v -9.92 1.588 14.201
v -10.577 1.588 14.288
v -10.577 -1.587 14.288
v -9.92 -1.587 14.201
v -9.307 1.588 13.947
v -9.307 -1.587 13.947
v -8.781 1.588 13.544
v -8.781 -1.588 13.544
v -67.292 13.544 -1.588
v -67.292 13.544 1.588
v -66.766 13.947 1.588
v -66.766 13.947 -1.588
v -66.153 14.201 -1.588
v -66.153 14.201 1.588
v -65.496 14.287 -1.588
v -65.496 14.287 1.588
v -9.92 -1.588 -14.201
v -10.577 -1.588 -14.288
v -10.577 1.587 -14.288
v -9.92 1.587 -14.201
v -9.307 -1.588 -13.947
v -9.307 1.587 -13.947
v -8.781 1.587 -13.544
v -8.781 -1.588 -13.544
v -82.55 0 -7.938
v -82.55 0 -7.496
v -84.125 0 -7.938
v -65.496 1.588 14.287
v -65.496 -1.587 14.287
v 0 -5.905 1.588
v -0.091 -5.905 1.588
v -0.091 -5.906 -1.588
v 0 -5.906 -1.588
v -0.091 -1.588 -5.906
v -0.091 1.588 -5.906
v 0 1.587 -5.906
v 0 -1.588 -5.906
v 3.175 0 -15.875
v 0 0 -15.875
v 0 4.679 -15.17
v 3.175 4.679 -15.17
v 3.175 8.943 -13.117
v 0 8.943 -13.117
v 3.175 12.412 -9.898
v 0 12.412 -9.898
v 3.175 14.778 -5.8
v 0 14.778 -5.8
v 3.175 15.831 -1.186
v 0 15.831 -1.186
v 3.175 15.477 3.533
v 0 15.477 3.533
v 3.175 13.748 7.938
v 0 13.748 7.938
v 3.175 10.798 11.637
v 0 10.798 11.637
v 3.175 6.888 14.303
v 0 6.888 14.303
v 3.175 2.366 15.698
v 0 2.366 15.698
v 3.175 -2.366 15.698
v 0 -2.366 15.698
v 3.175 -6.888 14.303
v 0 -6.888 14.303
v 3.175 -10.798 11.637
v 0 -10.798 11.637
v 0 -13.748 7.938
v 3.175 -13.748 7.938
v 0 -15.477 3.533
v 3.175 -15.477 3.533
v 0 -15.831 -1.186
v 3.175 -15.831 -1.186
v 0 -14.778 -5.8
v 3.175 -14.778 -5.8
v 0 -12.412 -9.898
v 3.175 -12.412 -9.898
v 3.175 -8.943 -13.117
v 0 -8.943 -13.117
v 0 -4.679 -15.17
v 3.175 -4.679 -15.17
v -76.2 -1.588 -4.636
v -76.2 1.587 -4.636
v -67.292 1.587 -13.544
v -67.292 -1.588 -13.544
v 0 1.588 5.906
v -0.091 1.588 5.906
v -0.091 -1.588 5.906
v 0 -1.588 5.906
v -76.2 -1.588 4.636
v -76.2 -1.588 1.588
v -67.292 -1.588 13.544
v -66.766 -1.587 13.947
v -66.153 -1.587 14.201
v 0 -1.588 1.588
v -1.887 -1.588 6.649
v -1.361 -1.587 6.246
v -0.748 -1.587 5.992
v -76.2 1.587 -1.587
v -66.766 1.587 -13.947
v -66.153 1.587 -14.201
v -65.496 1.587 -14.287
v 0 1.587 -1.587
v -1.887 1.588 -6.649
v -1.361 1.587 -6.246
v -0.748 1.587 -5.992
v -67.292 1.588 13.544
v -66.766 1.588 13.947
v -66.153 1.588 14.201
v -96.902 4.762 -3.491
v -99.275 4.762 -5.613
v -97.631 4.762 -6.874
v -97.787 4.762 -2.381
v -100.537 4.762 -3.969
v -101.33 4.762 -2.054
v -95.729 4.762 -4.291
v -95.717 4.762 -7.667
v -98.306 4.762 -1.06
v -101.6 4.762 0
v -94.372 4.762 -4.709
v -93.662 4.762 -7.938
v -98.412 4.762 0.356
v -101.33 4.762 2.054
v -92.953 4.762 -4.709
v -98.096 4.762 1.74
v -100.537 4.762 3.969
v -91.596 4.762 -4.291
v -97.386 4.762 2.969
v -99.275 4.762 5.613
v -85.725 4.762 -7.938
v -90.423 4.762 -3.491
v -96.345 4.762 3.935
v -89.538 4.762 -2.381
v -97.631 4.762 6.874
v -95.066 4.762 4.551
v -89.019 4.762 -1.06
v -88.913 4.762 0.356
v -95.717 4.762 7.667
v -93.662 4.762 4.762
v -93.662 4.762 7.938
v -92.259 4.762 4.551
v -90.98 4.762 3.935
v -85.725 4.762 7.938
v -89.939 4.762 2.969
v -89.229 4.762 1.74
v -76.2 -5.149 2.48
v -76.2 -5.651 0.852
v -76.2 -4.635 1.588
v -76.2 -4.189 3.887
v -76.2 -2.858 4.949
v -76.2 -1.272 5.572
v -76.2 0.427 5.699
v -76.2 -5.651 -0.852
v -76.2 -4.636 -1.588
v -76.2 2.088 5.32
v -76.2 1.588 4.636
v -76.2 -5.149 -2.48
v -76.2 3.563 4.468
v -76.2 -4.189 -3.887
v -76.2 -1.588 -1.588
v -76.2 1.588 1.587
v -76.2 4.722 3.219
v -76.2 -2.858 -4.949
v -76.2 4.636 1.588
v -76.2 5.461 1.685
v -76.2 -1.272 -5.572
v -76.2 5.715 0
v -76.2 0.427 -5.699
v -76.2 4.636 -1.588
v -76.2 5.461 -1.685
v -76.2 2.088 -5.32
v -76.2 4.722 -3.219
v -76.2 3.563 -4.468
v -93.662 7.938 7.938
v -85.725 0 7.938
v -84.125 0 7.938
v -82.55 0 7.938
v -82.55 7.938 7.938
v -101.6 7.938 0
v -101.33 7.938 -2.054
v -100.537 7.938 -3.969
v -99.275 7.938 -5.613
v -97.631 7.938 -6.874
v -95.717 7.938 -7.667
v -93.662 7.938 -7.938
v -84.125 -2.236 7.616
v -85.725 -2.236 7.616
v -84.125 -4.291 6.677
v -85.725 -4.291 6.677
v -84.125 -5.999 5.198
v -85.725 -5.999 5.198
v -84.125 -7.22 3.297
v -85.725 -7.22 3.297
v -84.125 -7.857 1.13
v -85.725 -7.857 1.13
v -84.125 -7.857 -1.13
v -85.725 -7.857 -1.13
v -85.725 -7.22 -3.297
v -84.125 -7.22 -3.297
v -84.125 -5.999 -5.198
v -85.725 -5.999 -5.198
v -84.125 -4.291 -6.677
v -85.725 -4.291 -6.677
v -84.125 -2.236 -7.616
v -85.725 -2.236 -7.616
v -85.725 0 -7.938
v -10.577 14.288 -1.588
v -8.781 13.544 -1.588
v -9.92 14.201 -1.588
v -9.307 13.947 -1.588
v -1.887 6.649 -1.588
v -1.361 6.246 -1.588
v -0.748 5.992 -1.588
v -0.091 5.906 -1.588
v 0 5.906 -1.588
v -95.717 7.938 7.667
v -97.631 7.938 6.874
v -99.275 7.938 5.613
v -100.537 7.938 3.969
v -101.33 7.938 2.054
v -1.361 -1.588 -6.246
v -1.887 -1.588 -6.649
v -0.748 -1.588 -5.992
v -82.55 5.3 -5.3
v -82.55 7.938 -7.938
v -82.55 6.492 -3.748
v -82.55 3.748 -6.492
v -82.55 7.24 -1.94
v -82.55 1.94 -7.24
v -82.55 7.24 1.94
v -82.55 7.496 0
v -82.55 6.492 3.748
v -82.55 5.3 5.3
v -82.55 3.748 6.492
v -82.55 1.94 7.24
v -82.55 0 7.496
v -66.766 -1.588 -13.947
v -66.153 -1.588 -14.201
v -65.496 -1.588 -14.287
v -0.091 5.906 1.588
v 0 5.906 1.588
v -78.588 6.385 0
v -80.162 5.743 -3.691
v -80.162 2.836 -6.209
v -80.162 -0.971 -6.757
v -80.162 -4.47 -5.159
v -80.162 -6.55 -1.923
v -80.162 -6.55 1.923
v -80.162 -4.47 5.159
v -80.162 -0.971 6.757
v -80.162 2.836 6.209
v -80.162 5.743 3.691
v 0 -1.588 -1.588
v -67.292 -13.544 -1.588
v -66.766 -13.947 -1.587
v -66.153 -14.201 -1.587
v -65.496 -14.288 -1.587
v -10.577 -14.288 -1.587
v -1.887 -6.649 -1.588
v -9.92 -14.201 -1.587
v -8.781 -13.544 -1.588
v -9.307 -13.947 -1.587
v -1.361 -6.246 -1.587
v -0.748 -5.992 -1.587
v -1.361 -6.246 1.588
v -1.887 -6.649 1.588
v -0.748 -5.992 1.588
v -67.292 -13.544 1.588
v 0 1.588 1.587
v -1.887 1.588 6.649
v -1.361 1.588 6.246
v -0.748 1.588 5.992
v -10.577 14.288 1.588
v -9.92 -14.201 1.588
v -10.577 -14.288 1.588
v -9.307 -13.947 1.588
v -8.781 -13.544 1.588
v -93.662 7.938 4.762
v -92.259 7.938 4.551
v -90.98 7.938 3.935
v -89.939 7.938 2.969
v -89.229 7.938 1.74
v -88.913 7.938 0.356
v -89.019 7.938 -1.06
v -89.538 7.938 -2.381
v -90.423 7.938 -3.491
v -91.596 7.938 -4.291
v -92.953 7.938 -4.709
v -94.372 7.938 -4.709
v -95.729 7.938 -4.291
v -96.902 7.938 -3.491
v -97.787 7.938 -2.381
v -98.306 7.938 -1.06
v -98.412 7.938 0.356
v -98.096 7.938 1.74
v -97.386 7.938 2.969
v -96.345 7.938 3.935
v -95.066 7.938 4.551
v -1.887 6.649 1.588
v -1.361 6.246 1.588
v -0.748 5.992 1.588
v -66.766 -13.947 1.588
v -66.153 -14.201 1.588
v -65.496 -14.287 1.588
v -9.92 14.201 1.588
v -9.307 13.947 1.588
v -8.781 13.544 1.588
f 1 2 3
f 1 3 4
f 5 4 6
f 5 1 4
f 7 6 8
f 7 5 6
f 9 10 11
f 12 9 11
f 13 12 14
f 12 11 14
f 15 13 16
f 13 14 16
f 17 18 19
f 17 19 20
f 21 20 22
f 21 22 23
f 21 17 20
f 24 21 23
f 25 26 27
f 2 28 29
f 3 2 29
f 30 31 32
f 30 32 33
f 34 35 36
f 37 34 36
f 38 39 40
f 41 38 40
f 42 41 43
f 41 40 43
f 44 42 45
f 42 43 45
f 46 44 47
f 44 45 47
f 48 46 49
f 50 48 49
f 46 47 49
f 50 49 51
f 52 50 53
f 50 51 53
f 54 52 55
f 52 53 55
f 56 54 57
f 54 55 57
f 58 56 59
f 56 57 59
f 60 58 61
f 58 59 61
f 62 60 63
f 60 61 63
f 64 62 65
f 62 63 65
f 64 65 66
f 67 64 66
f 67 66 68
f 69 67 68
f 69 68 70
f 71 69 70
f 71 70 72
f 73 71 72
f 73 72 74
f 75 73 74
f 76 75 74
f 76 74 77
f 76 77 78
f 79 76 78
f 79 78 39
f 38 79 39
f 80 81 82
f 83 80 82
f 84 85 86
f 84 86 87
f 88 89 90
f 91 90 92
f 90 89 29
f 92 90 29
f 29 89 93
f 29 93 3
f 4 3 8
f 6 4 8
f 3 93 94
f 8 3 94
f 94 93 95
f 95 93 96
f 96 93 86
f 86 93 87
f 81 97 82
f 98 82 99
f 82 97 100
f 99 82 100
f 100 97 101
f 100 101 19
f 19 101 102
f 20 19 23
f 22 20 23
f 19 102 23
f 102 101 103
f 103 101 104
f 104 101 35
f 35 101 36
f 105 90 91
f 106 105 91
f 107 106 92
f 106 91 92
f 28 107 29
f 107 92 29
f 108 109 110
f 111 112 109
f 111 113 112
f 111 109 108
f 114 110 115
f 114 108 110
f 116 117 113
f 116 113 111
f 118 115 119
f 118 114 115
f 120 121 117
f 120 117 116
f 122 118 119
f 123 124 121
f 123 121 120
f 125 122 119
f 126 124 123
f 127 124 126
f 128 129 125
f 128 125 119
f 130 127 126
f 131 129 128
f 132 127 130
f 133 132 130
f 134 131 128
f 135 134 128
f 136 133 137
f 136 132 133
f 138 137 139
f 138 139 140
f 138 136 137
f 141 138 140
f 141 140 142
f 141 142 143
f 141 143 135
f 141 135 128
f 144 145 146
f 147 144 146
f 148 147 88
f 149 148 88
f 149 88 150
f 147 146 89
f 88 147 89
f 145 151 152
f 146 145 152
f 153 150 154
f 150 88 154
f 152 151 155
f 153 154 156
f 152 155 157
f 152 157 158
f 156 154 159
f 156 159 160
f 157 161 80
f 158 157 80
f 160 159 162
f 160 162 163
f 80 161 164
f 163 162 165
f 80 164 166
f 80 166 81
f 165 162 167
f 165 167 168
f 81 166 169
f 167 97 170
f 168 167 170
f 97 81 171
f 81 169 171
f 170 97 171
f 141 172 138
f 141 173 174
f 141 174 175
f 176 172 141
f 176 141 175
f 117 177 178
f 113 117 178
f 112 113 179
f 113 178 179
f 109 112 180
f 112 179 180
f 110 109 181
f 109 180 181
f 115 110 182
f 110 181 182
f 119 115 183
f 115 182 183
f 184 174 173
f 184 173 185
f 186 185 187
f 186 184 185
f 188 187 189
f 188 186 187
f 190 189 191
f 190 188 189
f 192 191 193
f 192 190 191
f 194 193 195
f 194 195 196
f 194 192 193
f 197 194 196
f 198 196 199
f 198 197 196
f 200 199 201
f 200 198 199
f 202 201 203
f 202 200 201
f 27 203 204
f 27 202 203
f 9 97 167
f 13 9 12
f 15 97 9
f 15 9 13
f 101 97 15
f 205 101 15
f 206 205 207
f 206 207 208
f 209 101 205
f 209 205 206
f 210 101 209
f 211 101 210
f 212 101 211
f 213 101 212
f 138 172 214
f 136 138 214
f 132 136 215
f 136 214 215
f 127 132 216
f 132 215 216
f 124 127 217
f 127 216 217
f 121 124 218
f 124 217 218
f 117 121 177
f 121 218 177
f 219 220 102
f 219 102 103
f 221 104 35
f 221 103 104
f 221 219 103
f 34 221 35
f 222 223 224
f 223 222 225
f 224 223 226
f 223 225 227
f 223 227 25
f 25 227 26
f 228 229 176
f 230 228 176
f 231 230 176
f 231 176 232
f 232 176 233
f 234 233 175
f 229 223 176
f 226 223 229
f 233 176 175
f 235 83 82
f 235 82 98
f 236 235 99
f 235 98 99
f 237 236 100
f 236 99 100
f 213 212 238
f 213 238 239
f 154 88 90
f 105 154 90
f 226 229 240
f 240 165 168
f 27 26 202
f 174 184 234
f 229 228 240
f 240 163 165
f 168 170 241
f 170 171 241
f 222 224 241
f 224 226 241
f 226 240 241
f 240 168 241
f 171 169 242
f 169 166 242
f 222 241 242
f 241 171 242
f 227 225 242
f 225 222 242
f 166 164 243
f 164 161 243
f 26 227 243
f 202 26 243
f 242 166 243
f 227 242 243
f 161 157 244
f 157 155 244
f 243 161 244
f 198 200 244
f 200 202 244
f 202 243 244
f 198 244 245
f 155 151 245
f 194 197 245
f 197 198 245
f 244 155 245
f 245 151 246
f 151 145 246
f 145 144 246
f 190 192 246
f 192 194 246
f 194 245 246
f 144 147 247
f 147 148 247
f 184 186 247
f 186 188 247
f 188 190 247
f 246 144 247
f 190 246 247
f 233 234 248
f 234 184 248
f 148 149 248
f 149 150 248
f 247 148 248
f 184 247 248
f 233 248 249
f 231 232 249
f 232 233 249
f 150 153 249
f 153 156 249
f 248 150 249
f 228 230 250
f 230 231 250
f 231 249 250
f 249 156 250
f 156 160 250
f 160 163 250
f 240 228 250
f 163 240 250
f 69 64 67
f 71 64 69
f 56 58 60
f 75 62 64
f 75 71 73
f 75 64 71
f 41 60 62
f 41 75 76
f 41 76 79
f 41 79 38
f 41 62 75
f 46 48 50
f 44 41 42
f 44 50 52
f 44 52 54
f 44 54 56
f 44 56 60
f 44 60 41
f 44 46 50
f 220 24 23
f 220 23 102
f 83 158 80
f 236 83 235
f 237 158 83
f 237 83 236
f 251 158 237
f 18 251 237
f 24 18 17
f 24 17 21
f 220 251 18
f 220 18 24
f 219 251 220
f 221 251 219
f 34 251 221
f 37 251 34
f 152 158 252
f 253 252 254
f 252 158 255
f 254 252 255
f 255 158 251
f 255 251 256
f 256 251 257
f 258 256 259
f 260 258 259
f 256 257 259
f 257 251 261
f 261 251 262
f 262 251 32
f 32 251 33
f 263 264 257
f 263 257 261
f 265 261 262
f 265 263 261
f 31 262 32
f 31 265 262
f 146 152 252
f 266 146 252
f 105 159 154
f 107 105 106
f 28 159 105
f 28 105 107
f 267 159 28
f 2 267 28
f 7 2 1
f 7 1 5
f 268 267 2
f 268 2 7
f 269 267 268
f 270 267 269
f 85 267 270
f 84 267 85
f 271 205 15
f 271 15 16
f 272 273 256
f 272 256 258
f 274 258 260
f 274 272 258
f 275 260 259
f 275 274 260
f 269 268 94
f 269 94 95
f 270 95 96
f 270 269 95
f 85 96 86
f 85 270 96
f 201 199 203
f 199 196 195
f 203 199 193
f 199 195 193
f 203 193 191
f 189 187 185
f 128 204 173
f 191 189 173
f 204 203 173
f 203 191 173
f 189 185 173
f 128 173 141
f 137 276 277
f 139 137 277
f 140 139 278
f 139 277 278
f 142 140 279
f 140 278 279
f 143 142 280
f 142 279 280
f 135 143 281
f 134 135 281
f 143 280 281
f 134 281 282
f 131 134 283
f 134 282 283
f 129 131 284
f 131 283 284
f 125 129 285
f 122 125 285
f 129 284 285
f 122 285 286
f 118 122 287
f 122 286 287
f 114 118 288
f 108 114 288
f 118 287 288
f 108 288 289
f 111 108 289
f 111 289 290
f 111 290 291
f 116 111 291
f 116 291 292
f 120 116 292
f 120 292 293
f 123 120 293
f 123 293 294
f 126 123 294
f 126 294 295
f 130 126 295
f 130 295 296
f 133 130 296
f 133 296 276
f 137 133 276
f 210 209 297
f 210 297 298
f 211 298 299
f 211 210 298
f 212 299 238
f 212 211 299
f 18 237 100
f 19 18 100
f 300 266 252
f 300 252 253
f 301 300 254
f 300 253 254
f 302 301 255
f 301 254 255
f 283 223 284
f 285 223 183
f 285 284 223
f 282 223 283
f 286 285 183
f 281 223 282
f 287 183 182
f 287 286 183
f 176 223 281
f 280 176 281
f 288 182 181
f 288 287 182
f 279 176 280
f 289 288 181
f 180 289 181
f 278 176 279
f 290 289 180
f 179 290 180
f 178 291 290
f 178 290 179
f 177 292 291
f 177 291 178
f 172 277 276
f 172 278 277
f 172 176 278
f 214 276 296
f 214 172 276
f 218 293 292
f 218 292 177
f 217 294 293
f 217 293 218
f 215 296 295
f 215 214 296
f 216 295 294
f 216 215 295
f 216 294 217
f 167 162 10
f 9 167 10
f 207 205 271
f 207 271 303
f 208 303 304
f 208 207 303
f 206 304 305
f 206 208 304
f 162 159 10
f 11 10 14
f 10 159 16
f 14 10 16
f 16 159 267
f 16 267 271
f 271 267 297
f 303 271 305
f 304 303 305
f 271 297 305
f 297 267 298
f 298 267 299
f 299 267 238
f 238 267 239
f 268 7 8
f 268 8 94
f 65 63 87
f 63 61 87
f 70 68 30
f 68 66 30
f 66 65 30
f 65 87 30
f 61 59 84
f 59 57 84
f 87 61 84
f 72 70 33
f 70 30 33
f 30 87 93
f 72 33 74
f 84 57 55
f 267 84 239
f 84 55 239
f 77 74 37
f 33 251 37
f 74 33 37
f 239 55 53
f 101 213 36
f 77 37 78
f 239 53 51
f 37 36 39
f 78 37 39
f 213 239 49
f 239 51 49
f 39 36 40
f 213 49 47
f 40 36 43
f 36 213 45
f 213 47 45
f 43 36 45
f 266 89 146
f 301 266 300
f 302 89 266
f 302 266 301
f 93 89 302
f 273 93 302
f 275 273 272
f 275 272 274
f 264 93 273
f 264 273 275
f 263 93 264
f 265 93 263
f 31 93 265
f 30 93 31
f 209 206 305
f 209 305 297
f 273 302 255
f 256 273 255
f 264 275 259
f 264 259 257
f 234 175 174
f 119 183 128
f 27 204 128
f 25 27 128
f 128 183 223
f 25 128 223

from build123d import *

# Parameters (mm, degrees)
SKETCH1_R            = 15.875
BOSS_EXTRUDE1_DEPTH  = 3.175
SKETCH5_W            = 3.175
SKETCH5_H            = 14.2875
BOSS_EXTRUDE3_DEPTH  = 76.2
CUT_EXTRUDE1_DEPTH   = 80.770887743
CIRPATTERN2_COUNT    = 4
BOSS_EXTRUDE21_DEPTH = 1.6002
SKETCH18_W           = 3.175
SKETCH18_H           = 7.9375
CUT_EXTRUDE7_DEPTH   = 7.9375
SKETCH19_W           = 15.875
SKETCH19_H           = 3.175
BOSS_EXTRUDE22_DEPTH = 7.9375
SKETCH20_R           = 4.7625
CUT_EXTRUDE8_DEPTH   = 106.553828833


with BuildPart() as part:
    # Sketch1 → Boss-Extrude1 (new body)
    with BuildSketch(Plane(origin=(0, 0, 0), x_dir=(0, 0, -1), z_dir=(1, 0, 0))):
        Circle(SKETCH1_R)
    extrude(amount=BOSS_EXTRUDE1_DEPTH)

    # Sketch5 → Boss-Extrude3 (add)
    with BuildSketch(Plane.ZY):
        with Locations((0, 7.14375)):
            Rectangle(SKETCH5_W, SKETCH5_H)
    boss_extrude3 = extrude(amount=BOSS_EXTRUDE3_DEPTH)

    # Sketch6 → Cut-Extrude1 (cut, symmetric)
    with BuildSketch(Plane.XY.offset(1.5875)):
        with BuildLine():
            Line((0, 14.2875), (-10.577102448, 14.2875))
            ThreePointArc((-10.577102448, 14.2875), (-9.60508653, 14.094154013), (-8.781051224, 13.543551224))
            Line((-8.781051224, 13.543551224), (-1.886948776, 6.649448776))
            ThreePointArc((-1.886948776, 6.649448776), (-1.06291347, 6.098845987), (-0.090897552, 5.9055))
            Line((-0.090897552, 5.9055), (0, 5.9055))
            Line((0, 5.9055), (0, 14.2875))
        make_face()
        with BuildLine():
            ThreePointArc((-67.291948776, 13.543551224), (-66.46791347, 14.094154013), (-65.495897552, 14.2875))
            Line((-65.495897552, 14.2875), (-76.2, 14.2875))
            Line((-76.2, 14.2875), (-76.2, 4.6355))
            Line((-76.2, 4.6355), (-67.291948776, 13.543551224))
        make_face()
    cut_extrude1 = extrude(amount=CUT_EXTRUDE1_DEPTH, both=True, mode=Mode.SUBTRACT)

    # CirPattern2: Boss-Extrude3, Cut-Extrude1 ×4 about axis
    cirpattern2_axis = Axis((0, 0, 0), (1, 0, 0))
    add([boss_extrude3.rotate(cirpattern2_axis, i * 360 / CIRPATTERN2_COUNT) for i in range(1, CIRPATTERN2_COUNT)])
    add([cut_extrude1.rotate(cirpattern2_axis, i * 360 / CIRPATTERN2_COUNT) for i in range(1, CIRPATTERN2_COUNT)], mode=Mode.SUBTRACT)

    # Sketch8 → Revolve1 (revolve)
    with BuildSketch(Plane.XY):
        Polygon((-76.2, 0), (-84.1248, 0), (-84.1248, 7.9375), (-76.2, 5.715), align=None)
    revolve(axis=Axis((0, 0, 0), (-1, 0, 0)))

    # Sketch17 → Boss-Extrude21 (add)
    with BuildSketch(Plane.ZY.offset(84.1248)):
        with BuildLine():
            Line((-7.9375, 0), (7.9375, 0))
            ThreePointArc((7.9375, 0), (0, -7.9375), (-7.9375, 0))
        make_face()
    extrude(amount=BOSS_EXTRUDE21_DEPTH)

    # Sketch18 → Cut-Extrude7 (cut, symmetric)
    with BuildSketch(Plane.XY):
        with Locations((-84.1375, 3.96875)):
            Rectangle(SKETCH18_W, SKETCH18_H)
    extrude(amount=CUT_EXTRUDE7_DEPTH, both=True, mode=Mode.SUBTRACT)

    # Sketch19 → Boss-Extrude22 (add, symmetric)
    with BuildSketch(Plane.XY):
        with Locations((-93.6625, 6.35)):
            Rectangle(SKETCH19_W, SKETCH19_H)
        Polygon((-85.725, 7.9375), (-82.55, 7.9375), (-82.55, 0), (-85.725, 0), (-85.725, 4.7625), align=None)
    extrude(amount=BOSS_EXTRUDE22_DEPTH, both=True)

    # Sketch20 → Cut-Extrude8 (cut, through all)
    with BuildSketch(Plane(origin=(0, 7.9375, 0), x_dir=(-1, 0, 0), z_dir=(0, 1, 0))):
        with BuildLine():
            ThreePointArc((101.6, 0), (99.275160076, -5.612660076), (93.6625, -7.9375))
            Line((93.6625, -7.9375), (101.6, -7.9375))
            Line((101.6, -7.9375), (101.6, 0))
        make_face()
        with BuildLine():
            ThreePointArc((93.6625, 7.9375), (99.275160076, 5.612660076), (101.6, 0))
            Line((101.6, 0), (101.6, 7.9375))
            Line((101.6, 7.9375), (93.6625, 7.9375))
        make_face()
        with Locations(Location((93.6625, 0, 0), (0, 0, 90))):
            Circle(SKETCH20_R)
    extrude(amount=-CUT_EXTRUDE8_DEPTH, mode=Mode.SUBTRACT)


solid = part.part
